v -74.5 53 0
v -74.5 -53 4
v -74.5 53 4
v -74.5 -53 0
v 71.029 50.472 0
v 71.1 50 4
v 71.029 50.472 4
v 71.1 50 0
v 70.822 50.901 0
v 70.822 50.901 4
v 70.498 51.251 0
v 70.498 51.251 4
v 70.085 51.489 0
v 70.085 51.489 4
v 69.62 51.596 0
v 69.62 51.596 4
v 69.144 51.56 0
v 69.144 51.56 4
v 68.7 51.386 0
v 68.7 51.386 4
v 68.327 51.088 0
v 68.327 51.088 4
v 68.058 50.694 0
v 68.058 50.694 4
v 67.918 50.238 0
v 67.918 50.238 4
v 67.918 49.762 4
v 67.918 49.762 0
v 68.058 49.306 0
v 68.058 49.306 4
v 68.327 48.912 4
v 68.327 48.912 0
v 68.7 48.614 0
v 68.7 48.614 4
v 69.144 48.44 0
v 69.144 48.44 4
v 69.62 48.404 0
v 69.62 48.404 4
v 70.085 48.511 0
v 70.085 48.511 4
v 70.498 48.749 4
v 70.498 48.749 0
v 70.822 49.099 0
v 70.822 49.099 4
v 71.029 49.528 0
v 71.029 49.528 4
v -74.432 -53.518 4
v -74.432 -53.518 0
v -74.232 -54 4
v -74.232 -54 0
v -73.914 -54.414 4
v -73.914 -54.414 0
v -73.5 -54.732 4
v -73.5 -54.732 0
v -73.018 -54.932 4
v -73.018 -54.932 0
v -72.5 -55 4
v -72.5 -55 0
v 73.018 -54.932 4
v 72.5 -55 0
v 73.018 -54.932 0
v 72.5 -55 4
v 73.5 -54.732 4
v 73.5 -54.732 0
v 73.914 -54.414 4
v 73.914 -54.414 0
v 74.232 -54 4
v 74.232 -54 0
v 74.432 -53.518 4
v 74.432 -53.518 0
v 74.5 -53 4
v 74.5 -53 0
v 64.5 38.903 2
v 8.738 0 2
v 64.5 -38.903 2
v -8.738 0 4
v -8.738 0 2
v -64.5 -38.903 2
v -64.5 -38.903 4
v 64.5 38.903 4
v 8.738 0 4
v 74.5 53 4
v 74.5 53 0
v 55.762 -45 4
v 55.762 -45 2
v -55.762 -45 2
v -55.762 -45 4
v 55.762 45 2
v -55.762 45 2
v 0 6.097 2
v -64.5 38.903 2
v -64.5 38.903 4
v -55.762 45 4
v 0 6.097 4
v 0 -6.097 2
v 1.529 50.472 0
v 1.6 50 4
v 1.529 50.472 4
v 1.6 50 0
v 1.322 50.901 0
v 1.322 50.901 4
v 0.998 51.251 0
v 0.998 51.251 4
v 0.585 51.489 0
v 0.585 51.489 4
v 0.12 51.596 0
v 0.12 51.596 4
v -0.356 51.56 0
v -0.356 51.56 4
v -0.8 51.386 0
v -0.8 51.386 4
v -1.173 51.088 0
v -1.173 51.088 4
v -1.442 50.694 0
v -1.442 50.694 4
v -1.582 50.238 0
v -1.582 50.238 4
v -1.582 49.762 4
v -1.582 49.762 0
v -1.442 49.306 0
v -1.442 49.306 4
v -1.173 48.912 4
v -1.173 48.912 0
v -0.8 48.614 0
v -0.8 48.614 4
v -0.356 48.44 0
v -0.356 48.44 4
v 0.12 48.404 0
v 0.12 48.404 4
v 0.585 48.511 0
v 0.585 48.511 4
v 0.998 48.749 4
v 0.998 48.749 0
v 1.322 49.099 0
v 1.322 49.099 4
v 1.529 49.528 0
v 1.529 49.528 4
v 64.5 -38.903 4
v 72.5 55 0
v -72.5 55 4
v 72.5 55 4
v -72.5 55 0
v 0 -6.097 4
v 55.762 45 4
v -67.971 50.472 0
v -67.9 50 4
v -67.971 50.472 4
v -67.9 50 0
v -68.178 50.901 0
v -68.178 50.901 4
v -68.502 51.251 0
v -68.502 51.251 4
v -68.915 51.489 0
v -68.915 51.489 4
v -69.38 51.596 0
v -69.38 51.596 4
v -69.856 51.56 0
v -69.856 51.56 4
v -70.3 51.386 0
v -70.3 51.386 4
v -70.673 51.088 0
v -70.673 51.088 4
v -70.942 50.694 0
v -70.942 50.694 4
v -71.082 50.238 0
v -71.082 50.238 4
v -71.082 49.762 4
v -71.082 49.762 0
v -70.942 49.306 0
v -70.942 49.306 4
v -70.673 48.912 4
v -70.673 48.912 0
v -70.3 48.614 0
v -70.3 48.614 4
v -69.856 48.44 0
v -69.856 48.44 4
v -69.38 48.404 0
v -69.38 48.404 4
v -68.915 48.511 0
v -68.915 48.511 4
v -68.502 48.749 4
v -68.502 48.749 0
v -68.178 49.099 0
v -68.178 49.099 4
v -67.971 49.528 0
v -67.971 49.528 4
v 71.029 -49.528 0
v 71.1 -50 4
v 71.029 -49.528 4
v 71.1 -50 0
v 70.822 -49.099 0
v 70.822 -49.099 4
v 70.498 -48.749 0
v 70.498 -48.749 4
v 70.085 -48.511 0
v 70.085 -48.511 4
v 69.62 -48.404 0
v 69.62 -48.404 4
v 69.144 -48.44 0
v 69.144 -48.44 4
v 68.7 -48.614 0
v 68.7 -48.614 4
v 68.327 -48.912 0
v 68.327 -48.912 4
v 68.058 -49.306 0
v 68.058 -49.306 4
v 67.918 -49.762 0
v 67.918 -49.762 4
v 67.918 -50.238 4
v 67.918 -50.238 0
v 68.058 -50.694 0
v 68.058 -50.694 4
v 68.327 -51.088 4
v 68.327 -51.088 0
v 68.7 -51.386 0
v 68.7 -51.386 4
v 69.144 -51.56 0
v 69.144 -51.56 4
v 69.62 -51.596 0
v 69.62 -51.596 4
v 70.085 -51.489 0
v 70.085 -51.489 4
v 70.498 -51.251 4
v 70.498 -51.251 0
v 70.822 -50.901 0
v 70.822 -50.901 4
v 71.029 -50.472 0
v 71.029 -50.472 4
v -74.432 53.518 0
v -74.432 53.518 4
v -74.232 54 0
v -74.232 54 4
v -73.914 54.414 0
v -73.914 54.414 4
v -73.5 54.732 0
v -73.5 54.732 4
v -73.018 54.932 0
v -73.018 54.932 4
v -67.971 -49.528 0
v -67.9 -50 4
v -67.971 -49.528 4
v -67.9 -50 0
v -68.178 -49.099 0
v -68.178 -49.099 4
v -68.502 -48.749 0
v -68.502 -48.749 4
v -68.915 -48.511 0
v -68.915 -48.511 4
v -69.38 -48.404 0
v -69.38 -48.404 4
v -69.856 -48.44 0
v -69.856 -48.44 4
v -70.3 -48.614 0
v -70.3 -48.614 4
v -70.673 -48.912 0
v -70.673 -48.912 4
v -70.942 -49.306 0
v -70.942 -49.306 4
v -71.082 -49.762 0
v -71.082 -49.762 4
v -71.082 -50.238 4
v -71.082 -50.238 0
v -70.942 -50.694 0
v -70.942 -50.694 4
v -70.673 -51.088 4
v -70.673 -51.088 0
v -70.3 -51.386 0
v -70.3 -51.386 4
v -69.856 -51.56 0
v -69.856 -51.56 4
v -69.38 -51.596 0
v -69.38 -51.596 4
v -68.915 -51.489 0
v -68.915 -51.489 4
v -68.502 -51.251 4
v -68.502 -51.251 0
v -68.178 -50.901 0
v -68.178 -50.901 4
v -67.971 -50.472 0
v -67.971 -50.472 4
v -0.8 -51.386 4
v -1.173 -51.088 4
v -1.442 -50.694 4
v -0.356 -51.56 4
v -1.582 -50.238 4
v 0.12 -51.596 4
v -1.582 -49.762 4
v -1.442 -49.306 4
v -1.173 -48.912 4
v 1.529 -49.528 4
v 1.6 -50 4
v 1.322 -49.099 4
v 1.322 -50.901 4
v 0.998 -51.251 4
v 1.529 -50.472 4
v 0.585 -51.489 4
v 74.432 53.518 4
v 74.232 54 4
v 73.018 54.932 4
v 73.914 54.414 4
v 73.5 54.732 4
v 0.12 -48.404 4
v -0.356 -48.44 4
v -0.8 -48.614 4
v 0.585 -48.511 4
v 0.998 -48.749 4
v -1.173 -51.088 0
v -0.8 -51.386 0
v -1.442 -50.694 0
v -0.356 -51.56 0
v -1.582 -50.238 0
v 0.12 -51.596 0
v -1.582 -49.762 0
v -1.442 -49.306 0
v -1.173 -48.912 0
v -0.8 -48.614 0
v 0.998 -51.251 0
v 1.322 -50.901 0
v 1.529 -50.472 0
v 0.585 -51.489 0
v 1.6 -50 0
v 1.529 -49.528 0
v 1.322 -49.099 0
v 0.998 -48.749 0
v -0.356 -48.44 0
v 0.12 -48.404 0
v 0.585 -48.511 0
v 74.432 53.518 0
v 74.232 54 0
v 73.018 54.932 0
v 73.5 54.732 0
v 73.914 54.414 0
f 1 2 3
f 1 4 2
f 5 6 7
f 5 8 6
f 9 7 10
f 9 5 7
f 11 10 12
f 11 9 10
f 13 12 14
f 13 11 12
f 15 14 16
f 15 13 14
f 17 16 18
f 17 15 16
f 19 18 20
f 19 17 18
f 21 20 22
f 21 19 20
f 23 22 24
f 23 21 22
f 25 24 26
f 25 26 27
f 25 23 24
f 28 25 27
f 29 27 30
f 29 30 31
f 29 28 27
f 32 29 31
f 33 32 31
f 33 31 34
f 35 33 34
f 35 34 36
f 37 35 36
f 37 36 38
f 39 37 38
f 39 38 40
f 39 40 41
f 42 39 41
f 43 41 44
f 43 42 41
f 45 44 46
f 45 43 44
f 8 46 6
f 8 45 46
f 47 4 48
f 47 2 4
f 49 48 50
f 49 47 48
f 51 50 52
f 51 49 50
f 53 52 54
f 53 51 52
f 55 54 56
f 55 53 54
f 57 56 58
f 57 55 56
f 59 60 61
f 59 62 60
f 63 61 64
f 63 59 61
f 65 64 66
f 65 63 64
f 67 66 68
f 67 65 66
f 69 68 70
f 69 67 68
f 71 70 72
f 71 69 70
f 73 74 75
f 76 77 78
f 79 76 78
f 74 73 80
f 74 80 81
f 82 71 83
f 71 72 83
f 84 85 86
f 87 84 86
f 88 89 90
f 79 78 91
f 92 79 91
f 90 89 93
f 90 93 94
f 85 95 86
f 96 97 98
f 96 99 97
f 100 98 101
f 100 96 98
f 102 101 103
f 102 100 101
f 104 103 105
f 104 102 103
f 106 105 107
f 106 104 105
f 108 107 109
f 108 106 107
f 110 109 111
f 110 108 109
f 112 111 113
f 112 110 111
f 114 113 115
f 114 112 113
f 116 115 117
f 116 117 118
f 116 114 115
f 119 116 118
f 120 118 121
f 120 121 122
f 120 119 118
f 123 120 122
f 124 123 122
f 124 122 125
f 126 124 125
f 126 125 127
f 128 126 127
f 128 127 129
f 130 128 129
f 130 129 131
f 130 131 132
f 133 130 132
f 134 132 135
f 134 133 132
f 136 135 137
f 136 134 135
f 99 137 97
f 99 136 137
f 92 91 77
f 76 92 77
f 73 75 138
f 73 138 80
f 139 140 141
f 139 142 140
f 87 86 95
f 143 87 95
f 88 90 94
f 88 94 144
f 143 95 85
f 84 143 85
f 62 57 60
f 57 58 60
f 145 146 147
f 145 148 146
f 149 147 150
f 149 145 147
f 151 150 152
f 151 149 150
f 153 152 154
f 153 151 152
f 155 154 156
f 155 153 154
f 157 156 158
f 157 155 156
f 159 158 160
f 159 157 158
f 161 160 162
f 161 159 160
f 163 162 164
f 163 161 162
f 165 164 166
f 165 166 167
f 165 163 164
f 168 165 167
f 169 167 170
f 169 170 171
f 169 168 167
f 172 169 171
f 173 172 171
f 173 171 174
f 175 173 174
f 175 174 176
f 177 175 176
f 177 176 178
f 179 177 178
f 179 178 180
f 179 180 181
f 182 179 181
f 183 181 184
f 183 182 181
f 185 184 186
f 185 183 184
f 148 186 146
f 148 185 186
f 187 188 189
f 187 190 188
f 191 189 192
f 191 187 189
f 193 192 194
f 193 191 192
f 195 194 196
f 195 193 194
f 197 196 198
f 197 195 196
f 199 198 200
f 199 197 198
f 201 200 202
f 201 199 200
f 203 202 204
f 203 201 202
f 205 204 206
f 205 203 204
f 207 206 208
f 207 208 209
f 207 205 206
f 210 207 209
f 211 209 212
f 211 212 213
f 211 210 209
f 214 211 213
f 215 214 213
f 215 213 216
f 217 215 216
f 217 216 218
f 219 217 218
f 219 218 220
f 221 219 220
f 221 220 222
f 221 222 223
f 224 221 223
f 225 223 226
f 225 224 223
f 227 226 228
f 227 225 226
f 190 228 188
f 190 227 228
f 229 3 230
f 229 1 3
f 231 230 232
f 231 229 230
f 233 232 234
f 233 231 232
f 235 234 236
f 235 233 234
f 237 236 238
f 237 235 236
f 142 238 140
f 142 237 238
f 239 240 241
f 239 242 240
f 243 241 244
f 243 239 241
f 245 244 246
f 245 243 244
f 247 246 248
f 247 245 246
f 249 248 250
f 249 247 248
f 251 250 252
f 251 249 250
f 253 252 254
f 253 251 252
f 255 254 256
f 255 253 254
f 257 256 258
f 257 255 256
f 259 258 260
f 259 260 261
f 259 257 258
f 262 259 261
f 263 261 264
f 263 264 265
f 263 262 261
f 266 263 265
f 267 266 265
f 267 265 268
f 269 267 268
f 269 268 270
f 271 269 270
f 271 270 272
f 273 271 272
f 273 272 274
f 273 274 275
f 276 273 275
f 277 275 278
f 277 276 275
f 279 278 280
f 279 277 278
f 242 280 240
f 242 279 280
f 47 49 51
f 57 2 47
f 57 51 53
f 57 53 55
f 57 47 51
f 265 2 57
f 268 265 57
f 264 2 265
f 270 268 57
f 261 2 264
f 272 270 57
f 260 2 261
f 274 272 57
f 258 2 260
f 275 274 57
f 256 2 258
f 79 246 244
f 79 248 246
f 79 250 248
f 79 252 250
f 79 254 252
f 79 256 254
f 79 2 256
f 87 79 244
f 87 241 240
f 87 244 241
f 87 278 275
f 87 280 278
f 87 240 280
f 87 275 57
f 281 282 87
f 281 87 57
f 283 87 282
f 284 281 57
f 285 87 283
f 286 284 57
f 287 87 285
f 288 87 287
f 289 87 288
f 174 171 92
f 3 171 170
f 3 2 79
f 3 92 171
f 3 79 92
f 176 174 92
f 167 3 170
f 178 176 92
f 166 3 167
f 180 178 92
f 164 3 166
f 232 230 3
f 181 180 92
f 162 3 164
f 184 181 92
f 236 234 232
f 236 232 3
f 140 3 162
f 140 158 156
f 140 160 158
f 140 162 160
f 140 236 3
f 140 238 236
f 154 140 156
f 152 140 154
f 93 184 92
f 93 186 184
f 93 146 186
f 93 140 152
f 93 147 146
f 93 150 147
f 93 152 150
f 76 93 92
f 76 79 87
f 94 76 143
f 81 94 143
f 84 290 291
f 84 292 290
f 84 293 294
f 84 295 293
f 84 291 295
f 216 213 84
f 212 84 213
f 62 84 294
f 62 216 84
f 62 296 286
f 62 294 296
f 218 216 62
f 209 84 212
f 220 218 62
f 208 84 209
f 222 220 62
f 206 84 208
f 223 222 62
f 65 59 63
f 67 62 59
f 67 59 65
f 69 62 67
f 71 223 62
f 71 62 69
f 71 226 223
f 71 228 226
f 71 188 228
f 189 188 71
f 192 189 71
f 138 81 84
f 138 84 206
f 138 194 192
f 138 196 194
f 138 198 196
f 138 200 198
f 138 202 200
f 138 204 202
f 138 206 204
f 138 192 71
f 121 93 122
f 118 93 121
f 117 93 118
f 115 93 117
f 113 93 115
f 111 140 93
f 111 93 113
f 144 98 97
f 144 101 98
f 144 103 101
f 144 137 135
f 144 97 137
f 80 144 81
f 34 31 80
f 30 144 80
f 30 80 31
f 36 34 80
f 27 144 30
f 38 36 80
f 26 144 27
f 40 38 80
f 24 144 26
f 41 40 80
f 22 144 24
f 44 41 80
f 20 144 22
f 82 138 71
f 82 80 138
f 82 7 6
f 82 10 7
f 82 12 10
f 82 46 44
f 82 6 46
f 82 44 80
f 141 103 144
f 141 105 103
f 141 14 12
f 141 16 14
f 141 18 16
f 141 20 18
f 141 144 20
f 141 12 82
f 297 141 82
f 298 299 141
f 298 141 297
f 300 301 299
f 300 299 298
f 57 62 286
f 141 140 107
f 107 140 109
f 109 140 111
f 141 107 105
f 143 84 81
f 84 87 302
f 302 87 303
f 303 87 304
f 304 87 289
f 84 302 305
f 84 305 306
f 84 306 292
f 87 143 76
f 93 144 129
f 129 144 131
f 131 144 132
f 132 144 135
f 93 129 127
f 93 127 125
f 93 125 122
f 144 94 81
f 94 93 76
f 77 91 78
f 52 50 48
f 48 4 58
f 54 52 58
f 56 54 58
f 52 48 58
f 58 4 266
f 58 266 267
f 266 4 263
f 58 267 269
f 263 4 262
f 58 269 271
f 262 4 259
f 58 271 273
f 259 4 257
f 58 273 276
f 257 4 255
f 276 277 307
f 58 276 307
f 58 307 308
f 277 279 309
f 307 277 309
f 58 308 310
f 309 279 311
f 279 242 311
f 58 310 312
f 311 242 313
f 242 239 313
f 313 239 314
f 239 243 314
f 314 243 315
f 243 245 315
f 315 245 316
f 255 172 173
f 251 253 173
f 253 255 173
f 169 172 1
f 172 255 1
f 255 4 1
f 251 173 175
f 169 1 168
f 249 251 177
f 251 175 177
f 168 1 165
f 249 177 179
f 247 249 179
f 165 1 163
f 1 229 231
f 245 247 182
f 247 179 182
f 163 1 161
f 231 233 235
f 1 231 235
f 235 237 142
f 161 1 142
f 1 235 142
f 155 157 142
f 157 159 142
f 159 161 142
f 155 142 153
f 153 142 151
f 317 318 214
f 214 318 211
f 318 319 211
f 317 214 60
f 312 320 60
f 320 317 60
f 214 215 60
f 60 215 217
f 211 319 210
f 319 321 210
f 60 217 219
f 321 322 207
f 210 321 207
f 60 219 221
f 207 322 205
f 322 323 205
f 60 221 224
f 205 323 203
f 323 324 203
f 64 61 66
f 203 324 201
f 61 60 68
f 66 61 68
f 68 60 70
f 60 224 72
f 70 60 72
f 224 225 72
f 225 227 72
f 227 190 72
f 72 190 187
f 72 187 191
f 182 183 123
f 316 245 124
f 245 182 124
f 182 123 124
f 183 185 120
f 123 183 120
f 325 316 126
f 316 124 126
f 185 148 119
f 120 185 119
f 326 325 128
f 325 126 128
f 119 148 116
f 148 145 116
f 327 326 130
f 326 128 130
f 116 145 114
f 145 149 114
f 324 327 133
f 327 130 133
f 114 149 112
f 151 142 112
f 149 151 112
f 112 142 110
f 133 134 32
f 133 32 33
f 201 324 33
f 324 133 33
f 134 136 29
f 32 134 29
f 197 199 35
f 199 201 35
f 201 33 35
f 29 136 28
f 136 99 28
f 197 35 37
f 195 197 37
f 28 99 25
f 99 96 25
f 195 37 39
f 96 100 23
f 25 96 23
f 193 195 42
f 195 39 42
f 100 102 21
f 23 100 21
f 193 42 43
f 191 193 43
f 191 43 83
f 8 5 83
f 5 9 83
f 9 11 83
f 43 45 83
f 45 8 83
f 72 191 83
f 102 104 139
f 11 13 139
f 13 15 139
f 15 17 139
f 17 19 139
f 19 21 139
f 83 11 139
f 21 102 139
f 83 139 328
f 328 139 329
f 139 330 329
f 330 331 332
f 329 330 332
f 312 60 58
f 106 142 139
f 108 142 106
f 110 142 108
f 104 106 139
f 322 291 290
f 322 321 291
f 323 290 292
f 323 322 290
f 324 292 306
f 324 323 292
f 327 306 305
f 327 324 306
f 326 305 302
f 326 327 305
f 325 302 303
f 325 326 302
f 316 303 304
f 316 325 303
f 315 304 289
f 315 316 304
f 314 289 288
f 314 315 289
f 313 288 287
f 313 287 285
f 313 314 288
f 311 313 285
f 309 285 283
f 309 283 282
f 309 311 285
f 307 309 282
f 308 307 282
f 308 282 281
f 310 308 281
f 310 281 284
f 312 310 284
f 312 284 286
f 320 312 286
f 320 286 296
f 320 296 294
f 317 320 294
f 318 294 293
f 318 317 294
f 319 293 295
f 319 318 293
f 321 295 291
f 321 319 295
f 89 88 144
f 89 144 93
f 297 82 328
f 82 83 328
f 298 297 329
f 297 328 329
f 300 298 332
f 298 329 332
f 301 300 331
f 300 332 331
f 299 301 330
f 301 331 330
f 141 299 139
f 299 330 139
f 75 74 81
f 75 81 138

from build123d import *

# Parameters (mm, degrees)
SKICA1_W                = 149
SKICA1_H                = 110
SKICA1_R                = 1.6
P_IDAT_VYSUNUT_M1_DEPTH = 2
SKICA2_W                = 149
SKICA2_H                = 110
SKICA2_R                = 1.6
P_IDAT_VYSUNUT_M2_DEPTH = 2
ZAOBLIT1_R              = 2


with BuildPart() as part:
    # Skica1 → Přidat vysunutím1 (new body)
    with BuildSketch(Plane.XY):
        Rectangle(SKICA1_W, SKICA1_H)
        with Locations((-69.5, 50)):
            Circle(SKICA1_R, mode=Mode.SUBTRACT)
        with Locations((69.5, 50)):
            Circle(SKICA1_R, mode=Mode.SUBTRACT)
        with Locations((69.5, -50)):
            Circle(SKICA1_R, mode=Mode.SUBTRACT)
        with Locations((-69.5, -50)):
            Circle(SKICA1_R, mode=Mode.SUBTRACT)
        with Locations((0, 50)):
            Circle(SKICA1_R, mode=Mode.SUBTRACT)
        with Locations((0, -50)):
            Circle(SKICA1_R, mode=Mode.SUBTRACT)
    extrude(amount=P_IDAT_VYSUNUT_M1_DEPTH)

    # Skica2 → Přidat vysunutím2 (add)
    with BuildSketch(Plane.XY.offset(2)):
        Rectangle(SKICA2_W, SKICA2_H)
        with Locations((-69.5, -50)):
            Circle(SKICA2_R, mode=Mode.SUBTRACT)
        with Locations((69.5, -50)):
            Circle(SKICA2_R, mode=Mode.SUBTRACT)
        with Locations((69.5, 50)):
            Circle(SKICA2_R, mode=Mode.SUBTRACT)
        with Locations((-69.5, 50)):
            Circle(SKICA2_R, mode=Mode.SUBTRACT)
        with Locations((0, -50)):
            Circle(SKICA2_R, mode=Mode.SUBTRACT)
        with Locations((0, 50)):
            Circle(SKICA2_R, mode=Mode.SUBTRACT)
        Polygon((55.761515514, -45), (-55.761515514, -45), (0, -6.096617083), align=None, mode=Mode.SUBTRACT)
        Polygon((64.5, -38.903382917), (64.5, 38.903382917), (8.738484486, 0), align=None, mode=Mode.SUBTRACT)
        Polygon((55.761515514, 45), (-55.761515514, 45), (0, 6.096617083), align=None, mode=Mode.SUBTRACT)
        Polygon((-64.5, -38.903382917), (-64.5, 38.903382917), (-8.738484486, 0), align=None, mode=Mode.SUBTRACT)
    extrude(amount=P_IDAT_VYSUNUT_M2_DEPTH)

    # Zaoblit1
    zaoblit1_edges = [part.edges().sort_by_distance(p)[0] for p in [
        (74.5, -55, 2),
        (-74.5, -55, 2),
        (-74.5, 55, 2),
        (74.5, 55, 2),
    ]]
    fillet(zaoblit1_edges, radius=ZAOBLIT1_R)


solid = part.part
